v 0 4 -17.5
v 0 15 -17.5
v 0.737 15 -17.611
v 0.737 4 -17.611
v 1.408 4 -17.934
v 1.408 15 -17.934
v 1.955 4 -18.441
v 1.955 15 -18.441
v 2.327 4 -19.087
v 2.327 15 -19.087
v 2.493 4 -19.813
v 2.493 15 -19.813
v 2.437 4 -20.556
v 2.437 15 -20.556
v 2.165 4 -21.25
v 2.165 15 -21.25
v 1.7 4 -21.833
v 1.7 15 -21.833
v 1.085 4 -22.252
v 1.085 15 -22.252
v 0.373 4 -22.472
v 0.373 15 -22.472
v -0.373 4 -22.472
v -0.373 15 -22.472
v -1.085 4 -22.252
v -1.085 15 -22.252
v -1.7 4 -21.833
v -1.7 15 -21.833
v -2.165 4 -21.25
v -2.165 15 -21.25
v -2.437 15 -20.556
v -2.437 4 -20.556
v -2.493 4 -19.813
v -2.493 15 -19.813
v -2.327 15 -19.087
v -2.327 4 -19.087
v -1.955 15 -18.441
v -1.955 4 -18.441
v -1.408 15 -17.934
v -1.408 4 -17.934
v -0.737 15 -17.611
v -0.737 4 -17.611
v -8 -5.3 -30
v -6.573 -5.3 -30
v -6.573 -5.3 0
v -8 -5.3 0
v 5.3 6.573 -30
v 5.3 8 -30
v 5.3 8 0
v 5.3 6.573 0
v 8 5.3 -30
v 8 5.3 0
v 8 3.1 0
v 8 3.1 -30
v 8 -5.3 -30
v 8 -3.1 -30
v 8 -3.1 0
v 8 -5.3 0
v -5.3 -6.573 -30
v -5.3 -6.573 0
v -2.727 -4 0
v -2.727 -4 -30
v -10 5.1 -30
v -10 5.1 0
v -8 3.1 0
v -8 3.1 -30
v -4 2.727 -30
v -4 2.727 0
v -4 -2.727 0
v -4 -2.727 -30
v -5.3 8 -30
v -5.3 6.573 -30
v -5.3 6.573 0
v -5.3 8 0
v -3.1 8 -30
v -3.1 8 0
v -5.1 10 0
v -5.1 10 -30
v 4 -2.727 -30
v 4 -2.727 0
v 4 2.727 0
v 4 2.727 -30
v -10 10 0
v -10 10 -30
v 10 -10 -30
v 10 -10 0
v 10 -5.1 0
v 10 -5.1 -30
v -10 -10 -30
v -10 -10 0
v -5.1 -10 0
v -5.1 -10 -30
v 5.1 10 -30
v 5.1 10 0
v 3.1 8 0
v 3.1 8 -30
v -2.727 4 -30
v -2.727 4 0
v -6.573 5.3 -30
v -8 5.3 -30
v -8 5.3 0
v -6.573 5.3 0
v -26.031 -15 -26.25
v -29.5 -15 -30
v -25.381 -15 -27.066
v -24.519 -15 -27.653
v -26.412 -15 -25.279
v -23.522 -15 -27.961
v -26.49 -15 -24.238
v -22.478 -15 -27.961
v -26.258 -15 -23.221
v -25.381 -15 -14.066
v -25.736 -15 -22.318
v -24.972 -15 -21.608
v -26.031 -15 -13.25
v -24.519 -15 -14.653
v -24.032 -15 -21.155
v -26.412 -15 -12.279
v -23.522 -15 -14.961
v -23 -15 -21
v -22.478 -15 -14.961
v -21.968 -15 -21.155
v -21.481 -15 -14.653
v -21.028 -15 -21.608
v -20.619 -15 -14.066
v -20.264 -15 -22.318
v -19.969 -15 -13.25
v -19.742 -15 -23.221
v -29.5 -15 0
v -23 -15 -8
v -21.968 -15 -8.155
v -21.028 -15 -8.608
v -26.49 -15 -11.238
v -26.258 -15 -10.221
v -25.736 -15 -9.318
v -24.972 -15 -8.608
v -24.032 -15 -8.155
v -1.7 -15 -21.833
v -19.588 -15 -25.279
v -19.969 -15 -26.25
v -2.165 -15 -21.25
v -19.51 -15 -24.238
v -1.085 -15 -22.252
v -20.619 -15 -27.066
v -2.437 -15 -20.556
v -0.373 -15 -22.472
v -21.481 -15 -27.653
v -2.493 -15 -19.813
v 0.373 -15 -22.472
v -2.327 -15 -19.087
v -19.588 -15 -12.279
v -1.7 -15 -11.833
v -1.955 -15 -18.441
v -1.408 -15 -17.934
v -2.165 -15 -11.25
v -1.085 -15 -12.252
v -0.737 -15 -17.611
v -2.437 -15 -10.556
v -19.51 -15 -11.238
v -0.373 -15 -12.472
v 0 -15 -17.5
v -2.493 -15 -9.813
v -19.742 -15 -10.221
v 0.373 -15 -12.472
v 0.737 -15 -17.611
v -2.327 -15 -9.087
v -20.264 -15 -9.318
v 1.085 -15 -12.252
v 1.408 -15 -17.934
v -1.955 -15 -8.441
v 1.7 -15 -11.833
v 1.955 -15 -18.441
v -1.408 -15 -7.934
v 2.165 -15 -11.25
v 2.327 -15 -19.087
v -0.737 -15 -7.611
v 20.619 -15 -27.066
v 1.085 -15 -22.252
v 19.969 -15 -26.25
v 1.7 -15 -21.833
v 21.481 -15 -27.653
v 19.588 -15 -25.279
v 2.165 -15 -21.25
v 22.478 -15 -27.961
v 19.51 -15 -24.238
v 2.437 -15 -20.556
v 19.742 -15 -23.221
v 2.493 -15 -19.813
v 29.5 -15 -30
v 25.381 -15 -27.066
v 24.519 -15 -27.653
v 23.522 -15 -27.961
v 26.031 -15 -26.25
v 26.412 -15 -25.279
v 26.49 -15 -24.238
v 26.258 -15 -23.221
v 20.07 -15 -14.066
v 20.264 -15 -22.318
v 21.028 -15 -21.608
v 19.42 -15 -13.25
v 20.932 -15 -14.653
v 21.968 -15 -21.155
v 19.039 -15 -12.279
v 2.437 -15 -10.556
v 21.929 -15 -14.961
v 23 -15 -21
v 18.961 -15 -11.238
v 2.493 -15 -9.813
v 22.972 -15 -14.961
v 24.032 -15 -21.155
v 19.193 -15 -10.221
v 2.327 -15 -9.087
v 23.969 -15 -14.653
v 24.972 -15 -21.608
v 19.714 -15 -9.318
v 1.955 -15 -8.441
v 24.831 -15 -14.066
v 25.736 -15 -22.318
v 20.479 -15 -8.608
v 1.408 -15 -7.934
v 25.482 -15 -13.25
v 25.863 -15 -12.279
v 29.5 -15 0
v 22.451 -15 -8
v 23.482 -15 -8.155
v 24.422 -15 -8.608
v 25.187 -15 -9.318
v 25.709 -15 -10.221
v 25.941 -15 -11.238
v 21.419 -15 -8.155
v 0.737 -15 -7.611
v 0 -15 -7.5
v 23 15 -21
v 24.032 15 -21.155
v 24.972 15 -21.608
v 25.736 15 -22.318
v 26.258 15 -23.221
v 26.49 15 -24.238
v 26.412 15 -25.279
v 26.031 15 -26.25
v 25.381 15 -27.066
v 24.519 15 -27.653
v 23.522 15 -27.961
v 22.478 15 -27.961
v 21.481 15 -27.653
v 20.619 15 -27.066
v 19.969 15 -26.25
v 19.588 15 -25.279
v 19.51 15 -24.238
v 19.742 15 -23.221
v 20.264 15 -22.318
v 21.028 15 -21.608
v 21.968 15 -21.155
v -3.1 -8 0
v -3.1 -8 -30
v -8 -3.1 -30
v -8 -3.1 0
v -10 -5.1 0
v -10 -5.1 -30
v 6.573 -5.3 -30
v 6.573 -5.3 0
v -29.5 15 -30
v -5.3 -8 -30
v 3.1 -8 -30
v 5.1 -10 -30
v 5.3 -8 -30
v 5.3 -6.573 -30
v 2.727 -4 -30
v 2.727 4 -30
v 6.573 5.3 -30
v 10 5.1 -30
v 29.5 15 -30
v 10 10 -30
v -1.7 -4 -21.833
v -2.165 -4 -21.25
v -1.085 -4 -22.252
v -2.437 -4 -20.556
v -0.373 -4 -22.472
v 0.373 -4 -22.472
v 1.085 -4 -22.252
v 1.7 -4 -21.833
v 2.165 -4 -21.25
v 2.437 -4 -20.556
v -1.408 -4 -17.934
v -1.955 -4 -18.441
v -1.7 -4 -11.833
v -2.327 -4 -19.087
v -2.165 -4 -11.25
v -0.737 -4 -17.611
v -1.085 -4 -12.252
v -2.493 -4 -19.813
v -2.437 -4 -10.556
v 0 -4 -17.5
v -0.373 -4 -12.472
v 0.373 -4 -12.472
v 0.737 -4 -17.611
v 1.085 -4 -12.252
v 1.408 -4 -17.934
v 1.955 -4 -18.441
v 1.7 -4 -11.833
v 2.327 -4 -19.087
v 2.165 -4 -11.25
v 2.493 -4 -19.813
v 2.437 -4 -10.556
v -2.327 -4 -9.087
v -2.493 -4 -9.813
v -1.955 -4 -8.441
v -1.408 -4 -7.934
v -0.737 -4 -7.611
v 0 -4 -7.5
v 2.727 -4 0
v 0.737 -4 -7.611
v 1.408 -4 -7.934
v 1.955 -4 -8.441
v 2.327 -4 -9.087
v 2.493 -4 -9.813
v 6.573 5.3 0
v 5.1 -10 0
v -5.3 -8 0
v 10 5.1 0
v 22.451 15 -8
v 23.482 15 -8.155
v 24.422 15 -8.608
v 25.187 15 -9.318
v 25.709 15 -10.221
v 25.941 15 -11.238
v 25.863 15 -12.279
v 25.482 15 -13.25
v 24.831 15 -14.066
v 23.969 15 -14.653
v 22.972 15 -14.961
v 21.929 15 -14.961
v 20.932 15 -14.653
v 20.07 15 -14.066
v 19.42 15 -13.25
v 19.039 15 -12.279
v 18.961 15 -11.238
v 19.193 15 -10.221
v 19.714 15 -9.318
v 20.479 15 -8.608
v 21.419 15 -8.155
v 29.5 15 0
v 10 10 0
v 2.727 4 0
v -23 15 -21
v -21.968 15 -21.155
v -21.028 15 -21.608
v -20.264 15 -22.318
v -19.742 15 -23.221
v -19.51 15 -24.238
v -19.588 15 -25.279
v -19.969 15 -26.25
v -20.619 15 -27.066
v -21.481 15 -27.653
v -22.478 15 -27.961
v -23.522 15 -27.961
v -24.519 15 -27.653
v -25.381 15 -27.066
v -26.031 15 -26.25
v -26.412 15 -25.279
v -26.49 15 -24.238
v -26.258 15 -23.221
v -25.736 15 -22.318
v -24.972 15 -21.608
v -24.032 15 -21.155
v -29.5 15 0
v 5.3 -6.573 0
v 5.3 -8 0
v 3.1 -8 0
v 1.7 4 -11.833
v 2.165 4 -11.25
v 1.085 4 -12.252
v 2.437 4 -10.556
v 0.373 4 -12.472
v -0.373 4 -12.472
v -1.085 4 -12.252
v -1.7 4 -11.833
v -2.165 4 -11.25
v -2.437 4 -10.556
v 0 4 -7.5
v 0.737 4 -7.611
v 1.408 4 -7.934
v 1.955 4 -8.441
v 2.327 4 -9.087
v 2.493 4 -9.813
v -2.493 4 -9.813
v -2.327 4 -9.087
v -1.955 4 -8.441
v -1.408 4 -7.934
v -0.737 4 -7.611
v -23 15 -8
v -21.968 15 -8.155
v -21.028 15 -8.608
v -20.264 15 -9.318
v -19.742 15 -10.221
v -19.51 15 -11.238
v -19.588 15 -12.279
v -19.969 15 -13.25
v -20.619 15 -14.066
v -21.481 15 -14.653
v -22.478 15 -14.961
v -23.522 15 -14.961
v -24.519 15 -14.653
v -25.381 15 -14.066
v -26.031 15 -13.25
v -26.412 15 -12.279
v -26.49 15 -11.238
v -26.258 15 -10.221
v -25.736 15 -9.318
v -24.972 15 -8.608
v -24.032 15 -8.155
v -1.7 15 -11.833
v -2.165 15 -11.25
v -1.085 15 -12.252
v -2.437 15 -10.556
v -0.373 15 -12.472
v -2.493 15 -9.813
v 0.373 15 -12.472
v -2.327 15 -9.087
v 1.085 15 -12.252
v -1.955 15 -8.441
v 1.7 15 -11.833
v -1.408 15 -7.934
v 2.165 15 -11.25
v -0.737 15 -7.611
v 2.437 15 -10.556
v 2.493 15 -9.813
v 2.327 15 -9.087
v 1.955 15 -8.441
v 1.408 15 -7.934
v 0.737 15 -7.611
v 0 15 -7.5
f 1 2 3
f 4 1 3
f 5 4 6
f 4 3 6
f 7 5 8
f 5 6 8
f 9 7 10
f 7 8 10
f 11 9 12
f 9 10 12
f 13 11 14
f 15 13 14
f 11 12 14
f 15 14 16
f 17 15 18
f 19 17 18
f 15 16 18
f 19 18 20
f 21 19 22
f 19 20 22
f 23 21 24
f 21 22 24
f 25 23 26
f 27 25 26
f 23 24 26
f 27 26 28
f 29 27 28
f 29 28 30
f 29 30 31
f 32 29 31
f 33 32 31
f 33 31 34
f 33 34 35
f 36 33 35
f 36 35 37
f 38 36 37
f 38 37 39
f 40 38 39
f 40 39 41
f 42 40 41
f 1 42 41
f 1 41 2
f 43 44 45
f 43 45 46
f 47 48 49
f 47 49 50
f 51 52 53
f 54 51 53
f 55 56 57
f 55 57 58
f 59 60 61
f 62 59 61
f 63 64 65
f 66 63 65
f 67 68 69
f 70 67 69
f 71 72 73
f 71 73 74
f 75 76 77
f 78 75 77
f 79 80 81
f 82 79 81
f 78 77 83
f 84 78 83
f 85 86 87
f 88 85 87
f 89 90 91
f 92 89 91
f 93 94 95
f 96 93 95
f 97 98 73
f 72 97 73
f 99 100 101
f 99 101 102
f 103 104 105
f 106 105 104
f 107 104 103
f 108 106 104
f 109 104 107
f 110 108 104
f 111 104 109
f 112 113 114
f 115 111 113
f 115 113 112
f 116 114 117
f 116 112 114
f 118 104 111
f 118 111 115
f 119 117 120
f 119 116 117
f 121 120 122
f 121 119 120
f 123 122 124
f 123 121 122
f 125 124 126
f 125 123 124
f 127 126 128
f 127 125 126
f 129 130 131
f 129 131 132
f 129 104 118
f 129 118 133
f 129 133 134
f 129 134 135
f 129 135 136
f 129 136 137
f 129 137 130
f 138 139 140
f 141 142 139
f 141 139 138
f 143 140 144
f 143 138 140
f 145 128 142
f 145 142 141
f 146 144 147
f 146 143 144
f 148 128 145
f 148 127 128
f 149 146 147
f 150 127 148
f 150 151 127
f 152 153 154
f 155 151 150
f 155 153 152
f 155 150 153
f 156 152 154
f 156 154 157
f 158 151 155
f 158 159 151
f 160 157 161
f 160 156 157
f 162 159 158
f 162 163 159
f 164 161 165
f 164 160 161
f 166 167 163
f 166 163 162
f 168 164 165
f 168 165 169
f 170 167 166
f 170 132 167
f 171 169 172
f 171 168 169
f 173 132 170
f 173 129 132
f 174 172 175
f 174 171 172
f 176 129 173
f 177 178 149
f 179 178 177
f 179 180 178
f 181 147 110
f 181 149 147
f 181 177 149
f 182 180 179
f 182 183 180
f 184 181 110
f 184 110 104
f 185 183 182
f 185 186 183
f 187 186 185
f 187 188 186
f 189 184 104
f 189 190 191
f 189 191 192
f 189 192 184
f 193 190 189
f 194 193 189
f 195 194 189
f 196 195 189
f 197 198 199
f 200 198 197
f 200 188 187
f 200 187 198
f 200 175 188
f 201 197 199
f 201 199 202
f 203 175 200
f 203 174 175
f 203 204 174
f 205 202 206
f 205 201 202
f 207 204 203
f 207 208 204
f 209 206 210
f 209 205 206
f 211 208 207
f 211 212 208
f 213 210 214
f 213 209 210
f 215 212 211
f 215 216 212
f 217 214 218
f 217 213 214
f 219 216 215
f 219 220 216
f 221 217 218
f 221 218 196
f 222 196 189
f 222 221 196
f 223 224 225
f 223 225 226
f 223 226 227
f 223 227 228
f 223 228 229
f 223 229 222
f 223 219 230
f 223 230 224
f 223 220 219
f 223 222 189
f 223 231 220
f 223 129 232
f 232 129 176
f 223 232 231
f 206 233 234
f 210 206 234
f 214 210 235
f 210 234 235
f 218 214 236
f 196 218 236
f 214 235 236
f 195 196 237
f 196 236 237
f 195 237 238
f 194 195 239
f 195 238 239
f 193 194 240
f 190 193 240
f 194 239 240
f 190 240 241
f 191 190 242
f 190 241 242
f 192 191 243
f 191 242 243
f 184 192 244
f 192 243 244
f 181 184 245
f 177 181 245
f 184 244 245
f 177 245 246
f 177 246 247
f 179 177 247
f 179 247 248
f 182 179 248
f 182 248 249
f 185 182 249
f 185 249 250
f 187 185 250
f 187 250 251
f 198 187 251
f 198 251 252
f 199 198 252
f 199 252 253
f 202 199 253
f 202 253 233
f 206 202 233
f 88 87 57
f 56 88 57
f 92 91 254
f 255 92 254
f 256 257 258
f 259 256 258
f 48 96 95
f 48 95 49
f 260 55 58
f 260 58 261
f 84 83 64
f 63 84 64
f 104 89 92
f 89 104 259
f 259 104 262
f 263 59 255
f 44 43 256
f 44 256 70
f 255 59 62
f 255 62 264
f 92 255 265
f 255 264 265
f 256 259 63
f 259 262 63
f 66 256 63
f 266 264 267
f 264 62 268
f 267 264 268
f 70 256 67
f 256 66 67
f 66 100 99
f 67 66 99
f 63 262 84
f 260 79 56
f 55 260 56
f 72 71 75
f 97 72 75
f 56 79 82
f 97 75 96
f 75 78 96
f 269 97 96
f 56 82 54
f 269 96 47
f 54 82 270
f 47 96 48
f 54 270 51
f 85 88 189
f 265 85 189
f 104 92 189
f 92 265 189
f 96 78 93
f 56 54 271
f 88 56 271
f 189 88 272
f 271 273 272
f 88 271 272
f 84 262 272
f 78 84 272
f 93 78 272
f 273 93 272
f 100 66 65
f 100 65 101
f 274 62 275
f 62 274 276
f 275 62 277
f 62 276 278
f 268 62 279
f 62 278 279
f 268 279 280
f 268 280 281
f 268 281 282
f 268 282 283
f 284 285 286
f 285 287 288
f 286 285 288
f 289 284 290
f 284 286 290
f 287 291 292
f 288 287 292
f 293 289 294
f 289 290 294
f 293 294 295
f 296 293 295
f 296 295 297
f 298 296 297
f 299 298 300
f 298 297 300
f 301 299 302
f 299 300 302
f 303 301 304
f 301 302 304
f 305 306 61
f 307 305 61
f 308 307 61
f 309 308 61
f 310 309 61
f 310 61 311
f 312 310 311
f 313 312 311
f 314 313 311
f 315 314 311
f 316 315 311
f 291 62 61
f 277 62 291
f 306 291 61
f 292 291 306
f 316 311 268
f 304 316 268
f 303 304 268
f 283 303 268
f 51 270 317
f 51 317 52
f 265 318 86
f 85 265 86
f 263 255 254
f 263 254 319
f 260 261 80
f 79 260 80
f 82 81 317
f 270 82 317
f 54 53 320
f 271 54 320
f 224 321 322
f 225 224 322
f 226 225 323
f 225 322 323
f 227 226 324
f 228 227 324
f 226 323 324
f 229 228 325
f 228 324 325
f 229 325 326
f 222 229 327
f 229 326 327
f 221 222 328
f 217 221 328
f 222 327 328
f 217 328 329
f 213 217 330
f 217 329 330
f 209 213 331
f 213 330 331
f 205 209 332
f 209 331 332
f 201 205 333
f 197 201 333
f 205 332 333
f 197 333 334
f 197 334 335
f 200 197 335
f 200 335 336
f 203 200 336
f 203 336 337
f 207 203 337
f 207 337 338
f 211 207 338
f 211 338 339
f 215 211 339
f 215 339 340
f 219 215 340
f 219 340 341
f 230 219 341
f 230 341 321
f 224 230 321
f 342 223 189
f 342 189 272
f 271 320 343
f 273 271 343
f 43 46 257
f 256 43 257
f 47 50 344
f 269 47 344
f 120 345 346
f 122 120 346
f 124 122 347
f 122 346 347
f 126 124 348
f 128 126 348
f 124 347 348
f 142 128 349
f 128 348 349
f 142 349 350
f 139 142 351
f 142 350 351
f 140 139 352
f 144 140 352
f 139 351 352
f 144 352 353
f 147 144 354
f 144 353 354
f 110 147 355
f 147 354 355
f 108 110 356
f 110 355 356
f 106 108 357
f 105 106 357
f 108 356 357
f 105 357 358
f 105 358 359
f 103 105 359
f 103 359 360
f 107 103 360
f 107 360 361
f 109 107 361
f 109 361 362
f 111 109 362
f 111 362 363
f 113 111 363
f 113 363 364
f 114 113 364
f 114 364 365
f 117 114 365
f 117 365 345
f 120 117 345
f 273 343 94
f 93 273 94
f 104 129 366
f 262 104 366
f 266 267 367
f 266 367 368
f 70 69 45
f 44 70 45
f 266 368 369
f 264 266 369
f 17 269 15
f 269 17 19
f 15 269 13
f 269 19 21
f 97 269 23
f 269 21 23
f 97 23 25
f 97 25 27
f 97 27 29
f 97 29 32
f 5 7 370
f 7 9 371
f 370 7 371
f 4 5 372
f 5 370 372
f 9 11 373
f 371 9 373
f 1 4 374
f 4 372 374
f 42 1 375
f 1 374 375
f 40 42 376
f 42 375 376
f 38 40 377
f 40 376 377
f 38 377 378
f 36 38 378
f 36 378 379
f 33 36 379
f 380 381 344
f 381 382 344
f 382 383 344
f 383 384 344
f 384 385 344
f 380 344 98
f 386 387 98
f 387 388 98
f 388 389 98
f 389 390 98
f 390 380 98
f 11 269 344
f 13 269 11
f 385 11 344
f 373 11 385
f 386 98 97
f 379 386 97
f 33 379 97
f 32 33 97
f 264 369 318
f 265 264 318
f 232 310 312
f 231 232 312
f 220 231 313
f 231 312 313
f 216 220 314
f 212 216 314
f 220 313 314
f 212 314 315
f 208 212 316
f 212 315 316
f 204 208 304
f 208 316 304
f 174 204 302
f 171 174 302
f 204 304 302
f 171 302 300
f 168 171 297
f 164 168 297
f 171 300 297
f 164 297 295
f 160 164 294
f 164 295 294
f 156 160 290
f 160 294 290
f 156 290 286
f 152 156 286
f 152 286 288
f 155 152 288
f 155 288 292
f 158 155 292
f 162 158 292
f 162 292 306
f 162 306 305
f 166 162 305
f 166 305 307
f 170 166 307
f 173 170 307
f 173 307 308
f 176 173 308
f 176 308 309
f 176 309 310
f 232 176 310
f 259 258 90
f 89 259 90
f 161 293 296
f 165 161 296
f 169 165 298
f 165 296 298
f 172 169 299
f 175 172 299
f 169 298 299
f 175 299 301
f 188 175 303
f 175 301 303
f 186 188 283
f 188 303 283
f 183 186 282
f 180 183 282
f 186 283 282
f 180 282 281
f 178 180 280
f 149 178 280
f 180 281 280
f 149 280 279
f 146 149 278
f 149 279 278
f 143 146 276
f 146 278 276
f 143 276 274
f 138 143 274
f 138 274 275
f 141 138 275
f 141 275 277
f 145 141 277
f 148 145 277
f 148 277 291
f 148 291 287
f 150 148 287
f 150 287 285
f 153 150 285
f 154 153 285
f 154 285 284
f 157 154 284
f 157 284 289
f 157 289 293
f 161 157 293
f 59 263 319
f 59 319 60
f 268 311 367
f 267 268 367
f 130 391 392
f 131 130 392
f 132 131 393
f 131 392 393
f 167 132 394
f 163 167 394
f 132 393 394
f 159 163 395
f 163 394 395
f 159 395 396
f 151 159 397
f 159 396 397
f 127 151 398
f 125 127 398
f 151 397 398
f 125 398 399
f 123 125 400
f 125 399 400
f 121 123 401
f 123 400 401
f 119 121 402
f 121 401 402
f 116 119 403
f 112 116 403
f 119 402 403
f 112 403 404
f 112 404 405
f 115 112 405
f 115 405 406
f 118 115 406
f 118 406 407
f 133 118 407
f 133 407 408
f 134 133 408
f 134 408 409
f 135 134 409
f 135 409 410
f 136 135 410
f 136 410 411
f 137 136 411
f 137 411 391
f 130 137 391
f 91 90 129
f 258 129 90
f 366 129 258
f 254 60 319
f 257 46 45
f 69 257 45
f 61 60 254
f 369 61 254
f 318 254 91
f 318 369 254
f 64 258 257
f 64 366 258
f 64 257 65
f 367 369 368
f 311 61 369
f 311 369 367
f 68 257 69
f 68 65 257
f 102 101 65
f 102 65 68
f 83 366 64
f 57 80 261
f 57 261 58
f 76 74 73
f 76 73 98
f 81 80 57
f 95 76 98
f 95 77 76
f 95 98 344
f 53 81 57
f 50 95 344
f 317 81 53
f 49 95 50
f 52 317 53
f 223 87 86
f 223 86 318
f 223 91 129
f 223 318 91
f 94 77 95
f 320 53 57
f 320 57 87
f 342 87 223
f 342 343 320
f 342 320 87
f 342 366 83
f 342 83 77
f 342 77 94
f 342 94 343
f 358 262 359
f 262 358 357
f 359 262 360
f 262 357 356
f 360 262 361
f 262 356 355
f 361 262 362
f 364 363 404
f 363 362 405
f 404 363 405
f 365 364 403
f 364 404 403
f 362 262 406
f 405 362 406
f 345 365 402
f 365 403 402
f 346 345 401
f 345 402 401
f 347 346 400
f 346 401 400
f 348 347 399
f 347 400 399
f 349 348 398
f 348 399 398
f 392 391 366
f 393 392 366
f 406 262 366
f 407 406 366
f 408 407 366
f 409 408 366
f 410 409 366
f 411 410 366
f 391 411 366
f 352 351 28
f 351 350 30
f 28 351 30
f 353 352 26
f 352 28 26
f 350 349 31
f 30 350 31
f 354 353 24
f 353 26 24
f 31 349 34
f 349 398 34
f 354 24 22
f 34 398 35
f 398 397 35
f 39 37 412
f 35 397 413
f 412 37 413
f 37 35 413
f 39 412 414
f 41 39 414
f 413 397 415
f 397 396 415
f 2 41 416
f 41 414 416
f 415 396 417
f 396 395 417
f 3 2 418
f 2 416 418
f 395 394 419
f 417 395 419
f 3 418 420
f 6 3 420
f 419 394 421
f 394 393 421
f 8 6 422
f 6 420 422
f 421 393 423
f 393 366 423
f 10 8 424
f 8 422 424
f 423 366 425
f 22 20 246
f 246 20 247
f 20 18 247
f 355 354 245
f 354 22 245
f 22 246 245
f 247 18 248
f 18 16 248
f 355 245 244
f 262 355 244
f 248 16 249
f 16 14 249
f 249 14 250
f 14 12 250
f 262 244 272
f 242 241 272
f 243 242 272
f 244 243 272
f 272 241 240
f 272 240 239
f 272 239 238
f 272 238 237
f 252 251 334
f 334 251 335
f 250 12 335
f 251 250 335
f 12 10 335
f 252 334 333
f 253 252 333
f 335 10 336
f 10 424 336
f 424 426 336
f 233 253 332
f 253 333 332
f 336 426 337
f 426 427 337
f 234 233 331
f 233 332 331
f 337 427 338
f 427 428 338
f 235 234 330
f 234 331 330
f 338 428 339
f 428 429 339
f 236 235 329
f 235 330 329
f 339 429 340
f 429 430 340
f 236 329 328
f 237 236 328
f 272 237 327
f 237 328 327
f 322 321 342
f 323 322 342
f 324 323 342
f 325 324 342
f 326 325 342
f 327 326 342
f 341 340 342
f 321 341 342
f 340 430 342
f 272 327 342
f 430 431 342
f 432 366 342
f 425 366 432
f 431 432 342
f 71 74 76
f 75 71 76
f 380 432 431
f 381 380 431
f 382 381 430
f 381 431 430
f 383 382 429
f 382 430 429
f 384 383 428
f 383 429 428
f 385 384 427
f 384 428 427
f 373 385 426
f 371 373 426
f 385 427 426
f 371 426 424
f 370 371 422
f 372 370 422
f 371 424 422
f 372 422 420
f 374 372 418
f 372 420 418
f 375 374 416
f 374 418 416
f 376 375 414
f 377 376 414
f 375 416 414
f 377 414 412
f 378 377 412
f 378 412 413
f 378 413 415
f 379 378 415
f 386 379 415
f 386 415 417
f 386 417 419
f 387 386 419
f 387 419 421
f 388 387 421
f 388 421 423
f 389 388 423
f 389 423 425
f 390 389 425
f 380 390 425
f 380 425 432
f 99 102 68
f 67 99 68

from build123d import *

# Parameters (mm, degrees)
SKETCH1_W           = 59
SKETCH1_H           = 30
BOSS_EXTRUDE1_DEPTH = 30
SKETCH2_R           = 2.5
SKETCH2_R_2         = 3.5
CUT_EXTRUDE1_DEPTH  = 52.674461778


with BuildPart() as part:
    # Sketch1 → Boss-Extrude1 (new body)
    with BuildSketch(Plane.XY):
        Rectangle(SKETCH1_W, SKETCH1_H)
        Polygon((4, 2.727207794), (6.572792206, 5.3), (8, 5.3), (8, 3.1), (10, 5.1), (10, 10), (5.1, 10), (3.1, 8), (5.3, 8), (5.3, 6.572792206), (2.727207794, 4), (-2.727207794, 4), (-5.3, 6.572792206), (-5.3, 8), (-3.1, 8), (-5.1, 10), (-10, 10), (-10, 5.1), (-8, 3.1), (-8, 5.3), (-6.572792206, 5.3), (-4, 2.727207794), (-4, -2.727207794), (-6.572792206, -5.3), (-8, -5.3), (-8, -3.1), (-10, -5.1), (-10, -10), (-5.1, -10), (-3.1, -8), (-5.3, -8), (-5.3, -6.572792206), (-2.727207794, -4), (2.727207794, -4), (5.3, -6.572792206), (5.3, -8), (3.1, -8), (5.1, -10), (10, -10), (10, -5.1), (8, -3.1), (8, -5.3), (6.572792206, -5.3), (4, -2.727207794), align=None, mode=Mode.SUBTRACT)
    extrude(amount=-BOSS_EXTRUDE1_DEPTH)

    # Sketch2 → Cut-Extrude1 (cut, through all)
    with BuildSketch(Plane(origin=(0, 15, 0), x_dir=(1, 0, 0), z_dir=(0, 1, 0))):
        with Locations(Location((0, 10, 0), (0, 0, 270))):
            Circle(SKETCH2_R)
        with Locations(Location((0, 20, 0), (0, 0, 270))):
            Circle(SKETCH2_R)
        with Locations(Location((-23, 24.5, 0), (0, 0, 270))):
            Circle(SKETCH2_R_2)
        with Locations(Location((23, 24.5, 0), (0, 0, 270))):
            Circle(SKETCH2_R_2)
        with Locations(Location((22.450748844, 11.5, 0), (0, 0, 270))):
            Circle(SKETCH2_R_2)
        with Locations(Location((-23, 11.5, 0), (0, 0, 270))):
            Circle(SKETCH2_R_2)
    extrude(amount=-CUT_EXTRUDE1_DEPTH, mode=Mode.SUBTRACT)


solid = part.part
